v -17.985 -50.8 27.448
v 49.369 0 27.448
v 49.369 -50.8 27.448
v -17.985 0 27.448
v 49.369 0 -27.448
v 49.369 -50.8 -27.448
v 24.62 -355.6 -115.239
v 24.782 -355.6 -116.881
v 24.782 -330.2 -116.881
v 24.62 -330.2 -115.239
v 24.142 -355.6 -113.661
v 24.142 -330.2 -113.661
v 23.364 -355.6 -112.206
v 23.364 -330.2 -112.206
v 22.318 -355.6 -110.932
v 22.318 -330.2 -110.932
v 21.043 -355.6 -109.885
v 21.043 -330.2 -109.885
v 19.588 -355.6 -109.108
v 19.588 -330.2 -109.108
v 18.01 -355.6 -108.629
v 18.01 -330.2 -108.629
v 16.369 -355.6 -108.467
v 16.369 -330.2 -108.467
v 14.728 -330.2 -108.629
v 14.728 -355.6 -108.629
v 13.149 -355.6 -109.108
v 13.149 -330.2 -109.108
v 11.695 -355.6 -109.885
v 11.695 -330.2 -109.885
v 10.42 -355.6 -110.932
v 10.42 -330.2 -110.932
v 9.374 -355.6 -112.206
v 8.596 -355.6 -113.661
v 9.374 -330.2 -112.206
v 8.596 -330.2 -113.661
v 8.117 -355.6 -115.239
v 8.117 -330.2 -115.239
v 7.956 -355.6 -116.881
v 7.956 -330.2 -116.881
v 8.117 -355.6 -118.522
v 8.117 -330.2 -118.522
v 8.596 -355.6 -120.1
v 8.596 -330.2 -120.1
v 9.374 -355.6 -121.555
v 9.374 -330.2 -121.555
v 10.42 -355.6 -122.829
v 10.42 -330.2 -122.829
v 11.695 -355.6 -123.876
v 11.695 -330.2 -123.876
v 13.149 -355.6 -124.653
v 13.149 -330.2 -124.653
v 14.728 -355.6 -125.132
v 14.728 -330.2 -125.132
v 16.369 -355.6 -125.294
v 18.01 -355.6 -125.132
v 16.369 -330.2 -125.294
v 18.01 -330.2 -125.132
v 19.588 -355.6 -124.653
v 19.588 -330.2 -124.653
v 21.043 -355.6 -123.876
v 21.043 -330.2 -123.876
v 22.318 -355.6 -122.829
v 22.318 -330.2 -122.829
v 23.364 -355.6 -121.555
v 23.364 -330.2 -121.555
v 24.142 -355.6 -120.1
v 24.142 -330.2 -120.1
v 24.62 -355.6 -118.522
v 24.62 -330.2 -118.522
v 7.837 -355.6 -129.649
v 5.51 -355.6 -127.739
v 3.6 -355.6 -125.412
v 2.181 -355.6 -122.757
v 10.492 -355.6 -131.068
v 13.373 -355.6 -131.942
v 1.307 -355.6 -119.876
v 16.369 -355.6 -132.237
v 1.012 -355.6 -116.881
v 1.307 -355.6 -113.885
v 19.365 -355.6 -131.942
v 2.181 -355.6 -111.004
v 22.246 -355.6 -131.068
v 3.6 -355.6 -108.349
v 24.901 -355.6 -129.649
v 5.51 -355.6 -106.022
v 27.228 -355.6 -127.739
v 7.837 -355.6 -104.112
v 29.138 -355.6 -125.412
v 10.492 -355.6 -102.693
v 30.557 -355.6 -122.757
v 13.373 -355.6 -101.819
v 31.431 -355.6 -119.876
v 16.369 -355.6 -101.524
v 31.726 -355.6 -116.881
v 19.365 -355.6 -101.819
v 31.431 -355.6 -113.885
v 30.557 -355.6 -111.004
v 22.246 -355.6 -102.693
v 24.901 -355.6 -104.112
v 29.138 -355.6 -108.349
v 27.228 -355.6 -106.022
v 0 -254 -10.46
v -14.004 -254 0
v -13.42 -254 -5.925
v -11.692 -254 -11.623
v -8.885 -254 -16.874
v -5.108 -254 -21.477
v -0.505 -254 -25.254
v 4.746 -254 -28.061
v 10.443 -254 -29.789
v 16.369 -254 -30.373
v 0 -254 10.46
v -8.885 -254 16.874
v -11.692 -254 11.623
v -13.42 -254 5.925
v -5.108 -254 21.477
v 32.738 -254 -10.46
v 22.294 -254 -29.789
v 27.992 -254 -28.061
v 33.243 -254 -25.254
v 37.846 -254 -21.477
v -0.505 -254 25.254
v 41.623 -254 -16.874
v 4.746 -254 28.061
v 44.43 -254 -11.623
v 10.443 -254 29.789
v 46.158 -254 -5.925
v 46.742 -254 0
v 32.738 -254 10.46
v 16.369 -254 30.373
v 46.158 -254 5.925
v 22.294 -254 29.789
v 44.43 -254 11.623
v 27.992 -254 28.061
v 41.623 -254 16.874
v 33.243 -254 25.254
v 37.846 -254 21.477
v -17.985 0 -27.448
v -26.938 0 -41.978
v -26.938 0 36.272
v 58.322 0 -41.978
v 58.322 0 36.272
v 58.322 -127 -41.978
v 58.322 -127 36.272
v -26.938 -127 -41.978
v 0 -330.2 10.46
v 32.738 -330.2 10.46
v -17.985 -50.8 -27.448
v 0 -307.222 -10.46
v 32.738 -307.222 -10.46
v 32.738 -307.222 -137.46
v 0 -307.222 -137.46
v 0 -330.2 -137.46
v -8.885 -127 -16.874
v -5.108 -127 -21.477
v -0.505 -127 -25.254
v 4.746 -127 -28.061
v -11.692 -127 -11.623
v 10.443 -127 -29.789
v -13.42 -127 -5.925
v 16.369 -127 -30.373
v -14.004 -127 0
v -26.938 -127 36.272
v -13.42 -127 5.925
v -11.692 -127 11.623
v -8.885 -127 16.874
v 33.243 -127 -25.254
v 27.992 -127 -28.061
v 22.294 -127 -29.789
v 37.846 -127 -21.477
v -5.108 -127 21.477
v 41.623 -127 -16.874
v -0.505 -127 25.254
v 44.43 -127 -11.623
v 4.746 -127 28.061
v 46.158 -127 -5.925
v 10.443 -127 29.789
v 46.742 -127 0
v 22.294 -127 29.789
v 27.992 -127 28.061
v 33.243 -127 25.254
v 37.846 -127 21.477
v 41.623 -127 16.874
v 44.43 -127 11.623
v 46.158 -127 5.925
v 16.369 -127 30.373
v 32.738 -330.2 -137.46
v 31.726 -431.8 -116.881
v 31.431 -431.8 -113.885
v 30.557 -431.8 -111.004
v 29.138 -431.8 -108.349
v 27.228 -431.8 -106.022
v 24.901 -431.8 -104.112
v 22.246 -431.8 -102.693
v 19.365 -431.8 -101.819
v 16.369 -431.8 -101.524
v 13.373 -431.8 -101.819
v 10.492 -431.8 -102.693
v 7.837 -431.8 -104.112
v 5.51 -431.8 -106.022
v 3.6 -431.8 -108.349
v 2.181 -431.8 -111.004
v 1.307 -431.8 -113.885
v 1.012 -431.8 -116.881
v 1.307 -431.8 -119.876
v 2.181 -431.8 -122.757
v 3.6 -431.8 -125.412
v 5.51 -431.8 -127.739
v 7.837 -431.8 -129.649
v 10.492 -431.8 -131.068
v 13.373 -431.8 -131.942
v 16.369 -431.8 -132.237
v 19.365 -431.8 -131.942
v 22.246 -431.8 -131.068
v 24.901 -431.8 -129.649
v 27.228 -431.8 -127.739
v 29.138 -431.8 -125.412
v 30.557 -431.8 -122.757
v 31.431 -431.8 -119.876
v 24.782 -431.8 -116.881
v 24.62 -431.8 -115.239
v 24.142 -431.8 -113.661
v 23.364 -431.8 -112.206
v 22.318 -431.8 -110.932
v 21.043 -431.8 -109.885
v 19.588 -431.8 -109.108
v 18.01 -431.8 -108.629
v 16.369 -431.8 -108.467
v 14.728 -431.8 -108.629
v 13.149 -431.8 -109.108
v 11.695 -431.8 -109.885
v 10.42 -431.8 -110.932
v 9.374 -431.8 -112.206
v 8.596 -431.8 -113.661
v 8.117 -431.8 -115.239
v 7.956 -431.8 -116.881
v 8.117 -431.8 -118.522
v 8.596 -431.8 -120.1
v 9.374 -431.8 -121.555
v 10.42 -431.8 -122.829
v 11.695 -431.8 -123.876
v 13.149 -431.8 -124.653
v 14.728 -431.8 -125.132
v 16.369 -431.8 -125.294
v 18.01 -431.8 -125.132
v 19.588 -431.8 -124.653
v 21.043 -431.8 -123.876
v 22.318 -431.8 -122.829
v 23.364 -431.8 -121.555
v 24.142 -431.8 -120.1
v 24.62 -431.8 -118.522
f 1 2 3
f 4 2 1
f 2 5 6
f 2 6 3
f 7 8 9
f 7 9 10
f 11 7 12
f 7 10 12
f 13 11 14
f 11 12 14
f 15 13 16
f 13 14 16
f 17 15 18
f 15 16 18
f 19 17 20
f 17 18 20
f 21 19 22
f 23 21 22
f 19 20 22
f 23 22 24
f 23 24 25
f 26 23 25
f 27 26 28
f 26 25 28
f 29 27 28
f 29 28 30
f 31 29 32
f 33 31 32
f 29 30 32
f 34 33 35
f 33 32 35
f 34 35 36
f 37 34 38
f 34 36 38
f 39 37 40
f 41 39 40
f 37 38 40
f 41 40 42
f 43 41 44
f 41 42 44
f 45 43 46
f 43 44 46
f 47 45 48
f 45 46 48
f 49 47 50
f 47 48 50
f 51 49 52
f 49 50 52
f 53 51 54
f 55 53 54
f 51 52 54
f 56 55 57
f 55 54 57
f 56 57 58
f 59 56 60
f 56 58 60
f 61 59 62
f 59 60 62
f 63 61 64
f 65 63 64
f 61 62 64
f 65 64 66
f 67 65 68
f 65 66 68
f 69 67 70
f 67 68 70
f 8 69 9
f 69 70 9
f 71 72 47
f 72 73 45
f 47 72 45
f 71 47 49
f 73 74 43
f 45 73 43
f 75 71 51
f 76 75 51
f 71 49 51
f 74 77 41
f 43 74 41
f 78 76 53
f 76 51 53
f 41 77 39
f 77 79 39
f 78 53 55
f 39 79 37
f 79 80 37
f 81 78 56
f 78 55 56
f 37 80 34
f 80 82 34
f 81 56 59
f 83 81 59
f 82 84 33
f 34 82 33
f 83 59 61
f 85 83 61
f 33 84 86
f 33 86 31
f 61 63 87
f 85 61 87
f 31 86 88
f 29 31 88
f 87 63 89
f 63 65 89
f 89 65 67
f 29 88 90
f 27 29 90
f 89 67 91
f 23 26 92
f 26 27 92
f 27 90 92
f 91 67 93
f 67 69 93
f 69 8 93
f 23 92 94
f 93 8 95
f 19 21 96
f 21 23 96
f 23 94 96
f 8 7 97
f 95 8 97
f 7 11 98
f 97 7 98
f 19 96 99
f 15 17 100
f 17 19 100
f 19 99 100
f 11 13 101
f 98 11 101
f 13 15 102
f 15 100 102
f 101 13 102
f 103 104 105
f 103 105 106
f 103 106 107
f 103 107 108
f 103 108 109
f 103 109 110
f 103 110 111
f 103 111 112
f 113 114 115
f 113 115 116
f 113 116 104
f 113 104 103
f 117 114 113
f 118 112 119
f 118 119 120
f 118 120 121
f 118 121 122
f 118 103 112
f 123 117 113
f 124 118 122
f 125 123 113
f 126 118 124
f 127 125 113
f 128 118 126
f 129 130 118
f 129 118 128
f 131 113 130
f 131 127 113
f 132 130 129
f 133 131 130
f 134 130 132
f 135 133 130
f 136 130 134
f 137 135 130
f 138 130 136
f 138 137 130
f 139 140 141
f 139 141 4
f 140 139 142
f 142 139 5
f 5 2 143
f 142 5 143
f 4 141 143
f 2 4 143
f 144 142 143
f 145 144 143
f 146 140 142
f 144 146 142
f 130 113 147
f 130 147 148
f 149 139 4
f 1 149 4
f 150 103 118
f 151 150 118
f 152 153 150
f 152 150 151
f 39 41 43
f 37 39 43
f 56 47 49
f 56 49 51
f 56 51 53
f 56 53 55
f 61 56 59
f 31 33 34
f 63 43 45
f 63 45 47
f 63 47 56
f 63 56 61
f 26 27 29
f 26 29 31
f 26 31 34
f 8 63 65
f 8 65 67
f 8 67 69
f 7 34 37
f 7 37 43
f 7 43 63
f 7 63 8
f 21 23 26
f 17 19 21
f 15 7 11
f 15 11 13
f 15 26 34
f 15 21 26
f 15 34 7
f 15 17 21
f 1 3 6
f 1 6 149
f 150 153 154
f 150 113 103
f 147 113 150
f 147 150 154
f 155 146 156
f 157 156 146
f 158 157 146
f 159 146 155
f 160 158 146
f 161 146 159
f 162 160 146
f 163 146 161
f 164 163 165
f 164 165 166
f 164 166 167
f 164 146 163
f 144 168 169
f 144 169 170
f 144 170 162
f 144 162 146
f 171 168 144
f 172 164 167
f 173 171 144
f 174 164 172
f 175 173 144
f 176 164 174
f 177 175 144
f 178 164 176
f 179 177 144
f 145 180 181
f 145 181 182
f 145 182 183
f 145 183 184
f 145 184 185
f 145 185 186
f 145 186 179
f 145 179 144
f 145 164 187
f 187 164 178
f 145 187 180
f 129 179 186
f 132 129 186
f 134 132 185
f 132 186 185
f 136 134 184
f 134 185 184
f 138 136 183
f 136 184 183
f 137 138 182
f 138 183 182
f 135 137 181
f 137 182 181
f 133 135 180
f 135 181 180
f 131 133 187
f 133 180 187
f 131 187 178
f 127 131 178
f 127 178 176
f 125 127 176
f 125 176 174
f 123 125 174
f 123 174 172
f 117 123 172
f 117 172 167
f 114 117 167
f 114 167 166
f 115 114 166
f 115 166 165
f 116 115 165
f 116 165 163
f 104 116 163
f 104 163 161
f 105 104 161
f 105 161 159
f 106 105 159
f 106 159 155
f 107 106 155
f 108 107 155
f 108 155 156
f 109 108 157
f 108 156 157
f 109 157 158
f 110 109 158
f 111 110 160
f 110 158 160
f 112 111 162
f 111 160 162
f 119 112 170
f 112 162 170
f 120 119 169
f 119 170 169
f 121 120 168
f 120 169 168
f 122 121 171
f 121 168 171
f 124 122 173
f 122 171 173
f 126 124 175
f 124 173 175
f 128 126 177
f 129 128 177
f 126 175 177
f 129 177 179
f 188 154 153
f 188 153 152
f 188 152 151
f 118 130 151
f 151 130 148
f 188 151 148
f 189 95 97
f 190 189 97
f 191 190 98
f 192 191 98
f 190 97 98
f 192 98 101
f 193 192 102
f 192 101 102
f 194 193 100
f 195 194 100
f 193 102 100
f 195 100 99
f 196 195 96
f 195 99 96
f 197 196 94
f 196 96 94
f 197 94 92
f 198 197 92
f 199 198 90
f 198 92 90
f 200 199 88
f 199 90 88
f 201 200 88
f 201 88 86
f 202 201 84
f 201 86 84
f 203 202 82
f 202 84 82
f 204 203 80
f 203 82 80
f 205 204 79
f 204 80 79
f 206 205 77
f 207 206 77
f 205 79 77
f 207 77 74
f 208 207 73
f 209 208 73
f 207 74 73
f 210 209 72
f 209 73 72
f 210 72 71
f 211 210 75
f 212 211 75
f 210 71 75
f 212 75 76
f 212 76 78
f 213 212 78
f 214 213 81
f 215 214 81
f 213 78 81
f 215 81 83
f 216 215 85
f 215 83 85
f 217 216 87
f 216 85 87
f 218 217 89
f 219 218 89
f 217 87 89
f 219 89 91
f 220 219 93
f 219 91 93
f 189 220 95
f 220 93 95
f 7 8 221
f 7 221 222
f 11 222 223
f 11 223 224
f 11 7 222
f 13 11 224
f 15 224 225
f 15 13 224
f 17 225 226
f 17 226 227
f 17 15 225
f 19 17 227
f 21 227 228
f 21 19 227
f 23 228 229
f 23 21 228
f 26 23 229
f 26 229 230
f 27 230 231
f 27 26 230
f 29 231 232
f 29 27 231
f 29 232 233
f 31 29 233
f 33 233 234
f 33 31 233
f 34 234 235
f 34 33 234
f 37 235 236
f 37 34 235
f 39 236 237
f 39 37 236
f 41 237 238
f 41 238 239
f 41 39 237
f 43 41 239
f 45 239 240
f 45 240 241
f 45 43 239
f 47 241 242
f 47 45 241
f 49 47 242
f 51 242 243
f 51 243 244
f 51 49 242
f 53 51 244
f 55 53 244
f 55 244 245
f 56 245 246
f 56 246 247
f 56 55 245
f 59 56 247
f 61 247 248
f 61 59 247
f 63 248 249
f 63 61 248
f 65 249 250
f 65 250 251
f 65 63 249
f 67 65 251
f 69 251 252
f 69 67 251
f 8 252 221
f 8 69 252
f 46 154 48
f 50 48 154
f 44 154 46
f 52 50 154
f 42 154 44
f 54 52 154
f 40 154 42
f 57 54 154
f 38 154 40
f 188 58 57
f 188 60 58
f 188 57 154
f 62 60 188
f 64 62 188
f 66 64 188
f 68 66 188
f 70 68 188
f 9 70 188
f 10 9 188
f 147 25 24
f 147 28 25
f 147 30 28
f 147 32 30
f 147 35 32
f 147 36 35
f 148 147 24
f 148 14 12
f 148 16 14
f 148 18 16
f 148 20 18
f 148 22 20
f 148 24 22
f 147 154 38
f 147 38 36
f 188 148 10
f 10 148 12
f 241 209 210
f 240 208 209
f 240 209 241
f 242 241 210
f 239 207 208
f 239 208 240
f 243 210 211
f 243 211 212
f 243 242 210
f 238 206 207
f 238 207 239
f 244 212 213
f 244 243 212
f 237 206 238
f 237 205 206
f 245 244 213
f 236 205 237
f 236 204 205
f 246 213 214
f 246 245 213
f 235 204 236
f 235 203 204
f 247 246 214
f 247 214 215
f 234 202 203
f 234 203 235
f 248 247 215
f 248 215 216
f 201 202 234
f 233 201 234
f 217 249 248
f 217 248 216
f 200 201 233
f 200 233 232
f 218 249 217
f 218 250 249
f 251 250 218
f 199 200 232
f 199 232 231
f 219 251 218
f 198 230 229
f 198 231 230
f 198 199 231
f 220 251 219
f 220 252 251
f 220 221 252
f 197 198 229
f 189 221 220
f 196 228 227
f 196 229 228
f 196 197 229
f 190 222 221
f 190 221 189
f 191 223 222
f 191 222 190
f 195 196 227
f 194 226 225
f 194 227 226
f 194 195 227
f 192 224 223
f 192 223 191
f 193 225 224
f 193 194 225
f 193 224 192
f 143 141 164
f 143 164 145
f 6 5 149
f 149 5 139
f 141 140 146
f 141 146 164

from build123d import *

# Parameters (mm, degrees)
F1_R      = 30.372934
F2_DEPTH  = 254
F0_W      = 85.260034
F0_H      = 78.249902
F3_DEPTH  = 127
F4_W      = 32.737821
F4_H      = 20.919922
F5_DEPTH  = 76.2
F6_W      = 32.737821
F6_H      = 22.9782
F7_DEPTH  = 127
F8_R      = 8.413126
F9_DEPTH  = 25.4
F10_R     = 15.35686
F10_R_2   = 8.413126
F11_DEPTH = 76.2
F12_W     = 67.353904
F12_H     = 54.895162
F13_DEPTH = 50.8


with BuildPart() as f2:
    # F1 (on face) → F2 (new body)
    with BuildSketch(Plane.XZ):
        with Locations((16.368911, 0)):
            Circle(F1_R)
    extrude(amount=F2_DEPTH)

    # F0 (on Front) → F3 (join)
    with BuildSketch(Plane.XZ):
        with Locations((15.692234, -2.852753)):
            Rectangle(F0_W, F0_H)
    extrude(amount=F3_DEPTH)

    # F4 (on face) → F5 (join)
    with BuildSketch(Plane.XZ.offset(254)):
        with Locations((16.36891, 0)):
            Rectangle(F4_W, F4_H)
    extrude(amount=F5_DEPTH)

    # F6 (on face) → F7 (join)
    with BuildSketch(Plane(origin=(0, 0, -10.459961), x_dir=(1, 0, 0), z_dir=(0, 0, -1))):
        with Locations((16.36891, 318.7109)):
            Rectangle(F6_W, F6_H)
    extrude(amount=F7_DEPTH)

    # F8 (on face) → F9 (join)
    with BuildSketch(Plane.XZ.offset(330.2)):
        with Locations((16.368911, -116.880521)):
            Circle(F8_R)
    extrude(amount=F9_DEPTH)

    # F12 (on face) → F13 (cut)
    with BuildSketch(Plane(origin=(0, 0, 0), x_dir=(-1, 0, 0), z_dir=(0, 1, 0))):
        with Locations((-15.692234, 0)):
            Rectangle(F12_W, F12_H)
    extrude(amount=-F13_DEPTH, mode=Mode.SUBTRACT)


with BuildPart() as f11:
    # F10 (on face) → F11 (new body)
    with BuildSketch(Plane.XZ.offset(355.6)):
        with Locations((16.368911, -116.880521)):
            Circle(F10_R)
        with Locations((16.368911, -116.880521)):
            Circle(F10_R_2, mode=Mode.SUBTRACT)
    extrude(amount=F11_DEPTH)


solid = Compound([f2.part, f11.part])
